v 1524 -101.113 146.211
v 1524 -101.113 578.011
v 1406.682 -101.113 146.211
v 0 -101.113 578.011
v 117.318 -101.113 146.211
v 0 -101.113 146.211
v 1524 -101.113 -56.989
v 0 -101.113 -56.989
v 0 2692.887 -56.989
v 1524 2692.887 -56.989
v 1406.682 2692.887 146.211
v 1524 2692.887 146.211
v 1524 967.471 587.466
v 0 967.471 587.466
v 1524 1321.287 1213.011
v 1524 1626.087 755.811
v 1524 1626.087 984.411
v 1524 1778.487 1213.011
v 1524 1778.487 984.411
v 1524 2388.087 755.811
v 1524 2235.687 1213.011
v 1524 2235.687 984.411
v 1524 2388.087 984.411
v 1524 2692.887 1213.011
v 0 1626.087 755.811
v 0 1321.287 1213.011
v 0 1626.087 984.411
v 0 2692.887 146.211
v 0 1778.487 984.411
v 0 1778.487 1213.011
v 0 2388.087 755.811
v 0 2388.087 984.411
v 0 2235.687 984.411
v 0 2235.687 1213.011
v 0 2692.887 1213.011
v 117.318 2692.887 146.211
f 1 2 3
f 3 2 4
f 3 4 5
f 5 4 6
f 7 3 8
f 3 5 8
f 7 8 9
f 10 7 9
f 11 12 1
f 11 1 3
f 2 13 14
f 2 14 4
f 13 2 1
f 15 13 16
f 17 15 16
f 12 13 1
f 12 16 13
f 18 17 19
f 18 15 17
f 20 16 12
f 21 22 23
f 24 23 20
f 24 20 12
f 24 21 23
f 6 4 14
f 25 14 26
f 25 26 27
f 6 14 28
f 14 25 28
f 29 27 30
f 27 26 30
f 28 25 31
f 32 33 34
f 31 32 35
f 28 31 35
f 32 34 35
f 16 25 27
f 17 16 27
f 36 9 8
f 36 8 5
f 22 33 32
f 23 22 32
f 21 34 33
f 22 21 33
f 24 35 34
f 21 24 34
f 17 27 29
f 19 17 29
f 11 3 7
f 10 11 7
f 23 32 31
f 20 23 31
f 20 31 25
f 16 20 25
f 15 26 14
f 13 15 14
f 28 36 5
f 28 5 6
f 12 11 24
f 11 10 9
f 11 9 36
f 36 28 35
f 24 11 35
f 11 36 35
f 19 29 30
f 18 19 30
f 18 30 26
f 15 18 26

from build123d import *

# Parameters (mm, degrees)
F1_DEPTH = 1524
F3_DEPTH = 2794.001


with BuildPart() as f1:
    # F0 (on Right) → F1 (new body)
    with BuildSketch(Plane.YZ):
        Polygon((-101.112783, 578.011213), (-101.112783, -56.988787), (2692.887217, -56.988787), (2692.887217, 1213.011213), (2235.687217, 1213.011213), (2235.687217, 984.411213), (2388.087217, 984.411213), (2388.087217, 755.811213), (1626.087217, 755.811213), (1626.087217, 984.411213), (1778.487217, 984.411213), (1778.487217, 1213.011213), (1321.287217, 1213.011213), (967.470828, 587.466061), align=None)
    extrude(amount=F1_DEPTH)

    # F2 (on face) → F3 (cut, through all)
    with BuildSketch(Plane.XZ.offset(101.112783)):
        Polygon((1406.682425, 146.211213), (1524, -56.988787), (1524, 146.211213), align=None)
        Polygon((0, 146.211213), (0, -56.988787), (117.317575, 146.211213), align=None)
    extrude(amount=-F3_DEPTH, mode=Mode.SUBTRACT)


solid = f1.part
